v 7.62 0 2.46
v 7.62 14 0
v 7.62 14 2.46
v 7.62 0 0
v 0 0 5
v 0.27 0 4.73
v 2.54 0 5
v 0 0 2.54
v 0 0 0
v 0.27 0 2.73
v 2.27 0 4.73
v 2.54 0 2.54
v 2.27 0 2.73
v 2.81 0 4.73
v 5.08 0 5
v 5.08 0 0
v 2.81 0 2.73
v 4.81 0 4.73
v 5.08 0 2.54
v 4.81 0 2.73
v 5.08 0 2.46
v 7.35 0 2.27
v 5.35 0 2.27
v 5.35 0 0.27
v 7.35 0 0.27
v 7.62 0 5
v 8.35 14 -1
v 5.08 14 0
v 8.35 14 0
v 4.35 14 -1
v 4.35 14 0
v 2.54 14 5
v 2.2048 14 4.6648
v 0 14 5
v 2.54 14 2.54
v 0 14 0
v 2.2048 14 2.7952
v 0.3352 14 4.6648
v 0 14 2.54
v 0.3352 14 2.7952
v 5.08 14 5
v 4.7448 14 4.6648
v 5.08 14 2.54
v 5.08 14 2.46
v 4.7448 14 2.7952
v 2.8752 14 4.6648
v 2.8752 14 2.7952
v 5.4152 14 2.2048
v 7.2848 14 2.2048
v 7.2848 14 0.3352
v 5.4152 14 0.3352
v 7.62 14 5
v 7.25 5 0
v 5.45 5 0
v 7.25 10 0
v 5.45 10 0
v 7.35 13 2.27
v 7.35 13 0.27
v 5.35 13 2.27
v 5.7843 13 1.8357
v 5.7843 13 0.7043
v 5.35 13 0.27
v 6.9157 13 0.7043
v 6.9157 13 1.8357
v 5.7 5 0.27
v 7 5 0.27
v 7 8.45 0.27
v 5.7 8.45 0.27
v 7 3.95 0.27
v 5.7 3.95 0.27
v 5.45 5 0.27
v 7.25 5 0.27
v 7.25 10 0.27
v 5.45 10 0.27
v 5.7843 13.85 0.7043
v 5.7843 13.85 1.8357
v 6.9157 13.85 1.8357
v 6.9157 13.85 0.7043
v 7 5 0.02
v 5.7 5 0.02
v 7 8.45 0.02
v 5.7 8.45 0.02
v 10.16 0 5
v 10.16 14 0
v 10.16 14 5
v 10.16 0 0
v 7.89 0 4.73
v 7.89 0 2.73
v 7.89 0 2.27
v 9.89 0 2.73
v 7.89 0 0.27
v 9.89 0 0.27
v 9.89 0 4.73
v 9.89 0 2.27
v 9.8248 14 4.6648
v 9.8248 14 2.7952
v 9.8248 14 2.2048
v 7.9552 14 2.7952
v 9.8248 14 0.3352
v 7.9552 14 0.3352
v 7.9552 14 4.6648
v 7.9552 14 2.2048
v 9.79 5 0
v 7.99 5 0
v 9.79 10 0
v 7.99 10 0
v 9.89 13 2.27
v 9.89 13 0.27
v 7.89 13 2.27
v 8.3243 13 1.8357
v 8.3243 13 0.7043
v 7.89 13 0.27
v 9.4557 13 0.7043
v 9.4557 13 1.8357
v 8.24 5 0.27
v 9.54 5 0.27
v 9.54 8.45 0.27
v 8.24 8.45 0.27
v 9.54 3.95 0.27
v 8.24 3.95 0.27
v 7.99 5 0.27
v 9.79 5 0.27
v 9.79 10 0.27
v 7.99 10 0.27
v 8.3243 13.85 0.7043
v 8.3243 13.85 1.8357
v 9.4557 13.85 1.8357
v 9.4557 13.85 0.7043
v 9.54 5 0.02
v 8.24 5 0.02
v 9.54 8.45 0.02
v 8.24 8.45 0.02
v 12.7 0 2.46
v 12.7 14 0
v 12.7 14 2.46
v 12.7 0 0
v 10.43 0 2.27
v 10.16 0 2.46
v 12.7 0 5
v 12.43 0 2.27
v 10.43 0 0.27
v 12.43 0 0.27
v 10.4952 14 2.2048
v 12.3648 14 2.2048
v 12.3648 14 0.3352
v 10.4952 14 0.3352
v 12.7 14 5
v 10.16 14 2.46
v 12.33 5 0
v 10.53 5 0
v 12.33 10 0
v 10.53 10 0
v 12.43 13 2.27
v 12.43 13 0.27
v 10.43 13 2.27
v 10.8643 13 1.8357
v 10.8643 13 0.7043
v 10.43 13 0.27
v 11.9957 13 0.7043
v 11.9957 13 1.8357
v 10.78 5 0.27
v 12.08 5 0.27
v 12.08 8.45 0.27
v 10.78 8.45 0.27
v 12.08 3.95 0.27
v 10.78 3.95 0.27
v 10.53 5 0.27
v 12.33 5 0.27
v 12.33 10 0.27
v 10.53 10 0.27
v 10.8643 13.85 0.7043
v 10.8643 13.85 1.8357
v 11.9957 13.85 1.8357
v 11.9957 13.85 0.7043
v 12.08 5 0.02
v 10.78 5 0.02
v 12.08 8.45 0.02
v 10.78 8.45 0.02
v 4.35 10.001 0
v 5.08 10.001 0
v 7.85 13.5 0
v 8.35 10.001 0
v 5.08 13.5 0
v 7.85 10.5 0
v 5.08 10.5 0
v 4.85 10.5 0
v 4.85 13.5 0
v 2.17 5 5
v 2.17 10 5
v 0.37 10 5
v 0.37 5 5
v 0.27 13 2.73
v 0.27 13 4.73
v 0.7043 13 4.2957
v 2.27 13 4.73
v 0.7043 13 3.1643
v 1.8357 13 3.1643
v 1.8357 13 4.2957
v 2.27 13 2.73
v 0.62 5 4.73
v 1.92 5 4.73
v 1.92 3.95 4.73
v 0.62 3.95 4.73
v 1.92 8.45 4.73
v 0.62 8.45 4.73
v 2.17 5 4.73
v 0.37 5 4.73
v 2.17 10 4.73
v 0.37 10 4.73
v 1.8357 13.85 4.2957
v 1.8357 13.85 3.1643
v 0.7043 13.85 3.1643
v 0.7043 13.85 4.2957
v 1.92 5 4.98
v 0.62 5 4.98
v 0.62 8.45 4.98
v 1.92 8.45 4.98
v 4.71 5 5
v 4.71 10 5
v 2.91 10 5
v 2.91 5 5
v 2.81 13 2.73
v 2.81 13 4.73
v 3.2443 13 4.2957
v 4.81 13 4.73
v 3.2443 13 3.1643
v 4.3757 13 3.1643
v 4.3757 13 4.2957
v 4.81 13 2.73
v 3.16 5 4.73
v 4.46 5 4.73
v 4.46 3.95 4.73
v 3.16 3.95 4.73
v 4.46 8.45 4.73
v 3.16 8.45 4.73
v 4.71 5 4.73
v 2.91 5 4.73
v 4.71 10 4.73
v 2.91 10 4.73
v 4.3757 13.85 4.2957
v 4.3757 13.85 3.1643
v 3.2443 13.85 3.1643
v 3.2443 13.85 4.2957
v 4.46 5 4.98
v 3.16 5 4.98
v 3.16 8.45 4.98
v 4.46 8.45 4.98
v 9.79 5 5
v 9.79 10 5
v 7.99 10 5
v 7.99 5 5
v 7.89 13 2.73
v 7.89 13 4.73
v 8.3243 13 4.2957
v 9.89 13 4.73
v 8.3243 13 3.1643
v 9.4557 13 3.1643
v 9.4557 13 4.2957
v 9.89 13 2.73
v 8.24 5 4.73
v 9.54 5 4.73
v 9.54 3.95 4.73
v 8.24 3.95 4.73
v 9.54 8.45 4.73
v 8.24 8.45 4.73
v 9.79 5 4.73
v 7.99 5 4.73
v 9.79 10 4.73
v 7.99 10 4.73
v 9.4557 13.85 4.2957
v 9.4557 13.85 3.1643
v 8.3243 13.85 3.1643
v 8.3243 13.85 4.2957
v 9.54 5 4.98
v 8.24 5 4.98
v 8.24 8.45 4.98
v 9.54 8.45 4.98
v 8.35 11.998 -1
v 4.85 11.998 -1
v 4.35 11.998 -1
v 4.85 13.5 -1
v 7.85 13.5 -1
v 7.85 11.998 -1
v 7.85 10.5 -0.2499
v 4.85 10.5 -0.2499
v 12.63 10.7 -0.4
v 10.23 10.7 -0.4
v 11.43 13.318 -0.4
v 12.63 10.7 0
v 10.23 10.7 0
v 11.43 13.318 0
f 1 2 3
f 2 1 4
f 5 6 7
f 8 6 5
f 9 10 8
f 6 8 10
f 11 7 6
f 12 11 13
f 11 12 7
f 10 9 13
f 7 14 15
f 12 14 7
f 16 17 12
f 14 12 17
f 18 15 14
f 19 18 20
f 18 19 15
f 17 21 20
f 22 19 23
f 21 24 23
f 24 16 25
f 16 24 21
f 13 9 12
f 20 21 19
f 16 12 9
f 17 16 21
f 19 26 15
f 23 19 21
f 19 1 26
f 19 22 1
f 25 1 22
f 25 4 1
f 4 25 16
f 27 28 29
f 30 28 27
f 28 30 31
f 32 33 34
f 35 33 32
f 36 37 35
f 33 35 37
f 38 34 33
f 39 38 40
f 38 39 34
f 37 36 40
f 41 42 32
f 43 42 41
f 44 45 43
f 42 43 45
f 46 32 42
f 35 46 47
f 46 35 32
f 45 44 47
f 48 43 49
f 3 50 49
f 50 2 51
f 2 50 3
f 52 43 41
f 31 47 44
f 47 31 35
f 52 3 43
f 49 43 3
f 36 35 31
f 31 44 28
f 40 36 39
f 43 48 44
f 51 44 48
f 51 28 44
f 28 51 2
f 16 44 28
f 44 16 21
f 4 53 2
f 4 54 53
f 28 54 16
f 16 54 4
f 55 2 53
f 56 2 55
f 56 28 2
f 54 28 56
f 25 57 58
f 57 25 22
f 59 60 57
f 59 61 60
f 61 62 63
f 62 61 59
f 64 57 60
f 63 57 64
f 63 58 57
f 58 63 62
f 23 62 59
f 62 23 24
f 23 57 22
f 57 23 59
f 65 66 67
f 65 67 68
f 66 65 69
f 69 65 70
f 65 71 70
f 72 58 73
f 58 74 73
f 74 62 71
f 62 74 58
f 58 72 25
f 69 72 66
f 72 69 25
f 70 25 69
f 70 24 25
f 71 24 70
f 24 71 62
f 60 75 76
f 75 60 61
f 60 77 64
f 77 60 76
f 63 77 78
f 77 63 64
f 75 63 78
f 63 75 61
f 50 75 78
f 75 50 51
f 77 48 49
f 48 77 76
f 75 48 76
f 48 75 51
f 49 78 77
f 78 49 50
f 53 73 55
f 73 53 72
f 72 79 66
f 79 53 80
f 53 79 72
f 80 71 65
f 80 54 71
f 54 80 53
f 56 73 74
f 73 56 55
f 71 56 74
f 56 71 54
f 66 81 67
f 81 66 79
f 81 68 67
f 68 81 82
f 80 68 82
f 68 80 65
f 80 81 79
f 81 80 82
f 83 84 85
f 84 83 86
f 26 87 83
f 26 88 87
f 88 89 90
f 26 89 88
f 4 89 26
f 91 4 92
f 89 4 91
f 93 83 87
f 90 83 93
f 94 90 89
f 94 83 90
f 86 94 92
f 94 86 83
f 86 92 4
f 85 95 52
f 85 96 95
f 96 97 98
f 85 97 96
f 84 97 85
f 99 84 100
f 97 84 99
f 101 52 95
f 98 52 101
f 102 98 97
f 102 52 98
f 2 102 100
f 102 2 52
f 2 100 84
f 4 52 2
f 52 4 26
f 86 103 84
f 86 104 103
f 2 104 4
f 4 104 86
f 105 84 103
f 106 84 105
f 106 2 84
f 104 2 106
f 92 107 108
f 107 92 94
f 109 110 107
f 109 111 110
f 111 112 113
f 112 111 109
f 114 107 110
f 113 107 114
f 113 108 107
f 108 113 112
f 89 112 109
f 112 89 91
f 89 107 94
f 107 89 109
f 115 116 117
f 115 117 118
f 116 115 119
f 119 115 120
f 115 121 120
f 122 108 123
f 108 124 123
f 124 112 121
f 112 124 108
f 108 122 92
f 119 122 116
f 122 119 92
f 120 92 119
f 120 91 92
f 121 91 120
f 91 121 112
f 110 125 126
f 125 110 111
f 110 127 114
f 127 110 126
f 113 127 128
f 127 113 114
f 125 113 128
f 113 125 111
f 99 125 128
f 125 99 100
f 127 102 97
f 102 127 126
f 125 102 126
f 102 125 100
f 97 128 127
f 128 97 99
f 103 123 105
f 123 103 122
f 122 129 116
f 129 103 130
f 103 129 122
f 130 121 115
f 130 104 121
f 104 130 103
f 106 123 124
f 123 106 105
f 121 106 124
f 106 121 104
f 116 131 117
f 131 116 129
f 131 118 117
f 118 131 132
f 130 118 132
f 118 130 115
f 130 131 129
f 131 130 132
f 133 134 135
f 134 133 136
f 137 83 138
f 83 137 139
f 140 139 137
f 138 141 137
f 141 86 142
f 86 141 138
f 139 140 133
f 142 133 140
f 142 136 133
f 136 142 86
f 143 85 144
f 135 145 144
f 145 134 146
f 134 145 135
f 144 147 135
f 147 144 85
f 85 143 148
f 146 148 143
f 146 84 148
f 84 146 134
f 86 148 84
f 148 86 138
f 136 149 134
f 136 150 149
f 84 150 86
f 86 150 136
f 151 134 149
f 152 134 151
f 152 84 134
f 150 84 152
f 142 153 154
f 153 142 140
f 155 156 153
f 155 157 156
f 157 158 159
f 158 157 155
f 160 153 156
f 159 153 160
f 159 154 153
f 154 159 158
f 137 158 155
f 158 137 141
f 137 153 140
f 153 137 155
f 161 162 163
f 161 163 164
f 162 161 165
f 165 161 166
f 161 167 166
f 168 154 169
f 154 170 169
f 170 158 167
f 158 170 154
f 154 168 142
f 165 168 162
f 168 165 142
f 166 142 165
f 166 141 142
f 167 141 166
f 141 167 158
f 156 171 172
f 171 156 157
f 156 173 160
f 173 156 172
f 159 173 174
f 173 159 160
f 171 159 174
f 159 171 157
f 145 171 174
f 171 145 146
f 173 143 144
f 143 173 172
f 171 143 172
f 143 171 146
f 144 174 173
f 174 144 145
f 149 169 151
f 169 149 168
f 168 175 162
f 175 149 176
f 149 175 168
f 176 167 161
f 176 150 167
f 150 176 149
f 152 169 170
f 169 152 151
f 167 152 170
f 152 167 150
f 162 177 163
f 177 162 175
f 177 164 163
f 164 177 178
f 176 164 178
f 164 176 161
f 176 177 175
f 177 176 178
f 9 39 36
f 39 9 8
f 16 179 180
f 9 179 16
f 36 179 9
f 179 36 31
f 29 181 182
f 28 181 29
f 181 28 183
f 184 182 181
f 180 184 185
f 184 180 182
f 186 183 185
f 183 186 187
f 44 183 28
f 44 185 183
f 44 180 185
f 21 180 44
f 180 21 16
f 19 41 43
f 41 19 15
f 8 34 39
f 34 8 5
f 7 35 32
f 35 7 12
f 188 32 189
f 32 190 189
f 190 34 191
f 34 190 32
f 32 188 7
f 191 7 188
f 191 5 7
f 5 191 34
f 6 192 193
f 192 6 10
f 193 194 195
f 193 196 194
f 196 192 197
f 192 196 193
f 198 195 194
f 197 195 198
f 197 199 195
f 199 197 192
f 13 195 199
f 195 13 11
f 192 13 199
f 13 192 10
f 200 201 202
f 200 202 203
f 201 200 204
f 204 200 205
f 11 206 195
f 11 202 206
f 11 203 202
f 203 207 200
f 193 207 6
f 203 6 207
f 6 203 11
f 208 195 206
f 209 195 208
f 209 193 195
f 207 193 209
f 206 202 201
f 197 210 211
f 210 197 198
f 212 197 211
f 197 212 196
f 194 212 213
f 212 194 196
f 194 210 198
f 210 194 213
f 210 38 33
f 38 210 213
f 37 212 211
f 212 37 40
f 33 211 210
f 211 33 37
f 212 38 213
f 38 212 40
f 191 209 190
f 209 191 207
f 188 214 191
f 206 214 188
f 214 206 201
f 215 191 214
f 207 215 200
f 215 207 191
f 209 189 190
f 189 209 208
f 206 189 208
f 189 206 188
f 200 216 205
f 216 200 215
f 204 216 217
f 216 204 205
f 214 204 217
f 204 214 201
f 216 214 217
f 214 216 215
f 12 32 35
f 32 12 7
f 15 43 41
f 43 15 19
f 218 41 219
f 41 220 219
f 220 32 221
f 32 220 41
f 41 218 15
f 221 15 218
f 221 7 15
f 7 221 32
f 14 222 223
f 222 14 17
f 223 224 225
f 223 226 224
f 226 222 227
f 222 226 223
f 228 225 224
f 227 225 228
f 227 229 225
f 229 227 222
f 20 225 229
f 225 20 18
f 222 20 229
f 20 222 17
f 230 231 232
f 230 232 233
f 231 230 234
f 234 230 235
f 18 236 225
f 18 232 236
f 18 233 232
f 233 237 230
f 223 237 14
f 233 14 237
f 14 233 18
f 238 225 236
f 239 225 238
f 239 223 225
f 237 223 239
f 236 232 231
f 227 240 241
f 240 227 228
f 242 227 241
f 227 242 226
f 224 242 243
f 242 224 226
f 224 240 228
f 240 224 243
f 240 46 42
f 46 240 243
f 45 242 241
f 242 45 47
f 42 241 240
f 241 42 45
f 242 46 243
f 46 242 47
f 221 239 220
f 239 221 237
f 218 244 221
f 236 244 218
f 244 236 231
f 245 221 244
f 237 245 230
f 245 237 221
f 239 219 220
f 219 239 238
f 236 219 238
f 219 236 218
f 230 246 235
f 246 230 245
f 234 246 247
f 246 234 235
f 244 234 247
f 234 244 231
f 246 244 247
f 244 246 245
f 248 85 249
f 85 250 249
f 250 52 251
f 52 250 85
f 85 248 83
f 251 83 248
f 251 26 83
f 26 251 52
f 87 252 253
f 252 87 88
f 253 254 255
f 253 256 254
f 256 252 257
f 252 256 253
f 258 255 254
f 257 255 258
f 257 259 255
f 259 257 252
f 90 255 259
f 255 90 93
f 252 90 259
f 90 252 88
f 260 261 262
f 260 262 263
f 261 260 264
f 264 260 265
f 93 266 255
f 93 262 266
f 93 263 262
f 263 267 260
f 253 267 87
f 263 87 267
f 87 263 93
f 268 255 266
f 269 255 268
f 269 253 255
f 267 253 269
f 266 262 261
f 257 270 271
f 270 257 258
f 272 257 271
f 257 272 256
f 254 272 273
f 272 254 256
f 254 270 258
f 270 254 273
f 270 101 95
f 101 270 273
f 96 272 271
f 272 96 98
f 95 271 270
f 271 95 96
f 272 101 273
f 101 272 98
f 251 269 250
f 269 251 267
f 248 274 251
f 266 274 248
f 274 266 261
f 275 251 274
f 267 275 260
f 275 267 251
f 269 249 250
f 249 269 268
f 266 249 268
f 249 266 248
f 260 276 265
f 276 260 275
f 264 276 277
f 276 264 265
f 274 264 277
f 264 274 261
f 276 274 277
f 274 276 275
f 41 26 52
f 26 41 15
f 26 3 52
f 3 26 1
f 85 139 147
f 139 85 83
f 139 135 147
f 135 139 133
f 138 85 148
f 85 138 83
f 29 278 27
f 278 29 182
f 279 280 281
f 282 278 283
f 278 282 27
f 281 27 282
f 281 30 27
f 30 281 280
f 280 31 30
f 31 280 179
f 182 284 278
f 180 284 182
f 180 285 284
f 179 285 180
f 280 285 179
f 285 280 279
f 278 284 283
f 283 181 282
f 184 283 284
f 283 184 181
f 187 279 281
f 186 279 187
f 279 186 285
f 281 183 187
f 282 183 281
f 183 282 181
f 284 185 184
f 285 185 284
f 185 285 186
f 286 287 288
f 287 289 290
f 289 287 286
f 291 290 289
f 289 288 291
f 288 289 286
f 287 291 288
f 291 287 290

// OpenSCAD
//===SETIINGS===
//the number of "shells" to make
rows = 5; // [1:*]

//two lines ?
Two_Lines = true; // [true:false]

//locked shells
//1 to x , start from axis
Line1 = [1,2];// [1:row] -1 if void
Line2 = [3,5];// [1:row] -1 if void

//arrow 
arrow = true;
triangle_height = 0.4;

//ploarizer
polarizer = true;
wall_thickness = 1;
no_support = true;

//===End Settings===

//function to add a normal shell
module shell() {
    translate([2.54/2, 7, 2.54/2]) 
    rotate([90, 0, 0])
    union() {
        difference() {
            cube([2.54, 2.54, 14], center=true);
            // inner hole/hollow
            translate([0, 0, 1])
                cube([2, 2, 14], center=true);
            // pin hole
            rotate([0, 0, 45])
                cylinder(r=0.8, h=60, center=true, $fn=4);
            // chamfer
            translate([0, 0, -7.1]) rotate([0, 0, 45]) 
                cylinder(r1=2.54, r2=0.8, h=0.5, center=true, $fn=4);
            // tab hole 
            translate([0, -1, -0.5])
            cube([1.8, 1, 5], center=true);
        }
        // tab
        translate([0, -1.125, 0.8])
            cube([1.3, 0.25, 4.5], center=true);
    }
}

//function to  add a a locked shell
module locked() {
    translate([2.54/2, 7, 2.54/2]) 
    rotate([0, 0, 90])
    cube([14, 2.54, 2.54], center=true);
}


//generate fist line
for(i = [0:rows-1])
    translate([2.54*i, 0, 0])
        //check if i+1 exist in Line1 then add a shell or a locked
        if(len(search((i+1), Line1)) > 0){
            locked();
        }else{
            shell();
        }

//generate second line if set
if(Two_Lines) {
    for(i = [0:rows-1]) 
        translate([2.54*i + 2.54, 0, 5]) rotate([0, 180, 0])
            //check if i+1 exist in Line2 then add a shell or a locked
            if(len(search((i+1), Line2)) > 0){
                locked();
            }else{
                shell();
            }
}

//draw arrow
if (arrow){
    translate([2.54/2 + 2.54*(rows-1),10.7, -triangle_height])
    linear_extrude(triangle_height)
    polygon(points = [[-2.4/2,0],[0,3.08*0.85],[2.4/2,0]],paths = [[0,1,2,0]]);
}

//polarizer
if (polarizer){
    ep = 1;
    la = 4;
    translate([(2.54*rows)/2, 14-(la/2),-ep/2])
    difference(){
        if(no_support){
            difference(){
                cube([la, la, ep], center=true);
                rotate([90,0,90])
                linear_extrude(5,center=true)
                polygon(points = [[-la/2-0.001,ep/2+0.001],[-la/2-0.001,-ep/2-0.001],[0,-ep/2-0.001]],paths = [[0,1,2,0]]);
            }
        } else {
            cube([la, la, ep], center=true);
        }
        cube([la- wall_thickness, la- wall_thickness, ep+0.001], center=true);
    }
    
}
